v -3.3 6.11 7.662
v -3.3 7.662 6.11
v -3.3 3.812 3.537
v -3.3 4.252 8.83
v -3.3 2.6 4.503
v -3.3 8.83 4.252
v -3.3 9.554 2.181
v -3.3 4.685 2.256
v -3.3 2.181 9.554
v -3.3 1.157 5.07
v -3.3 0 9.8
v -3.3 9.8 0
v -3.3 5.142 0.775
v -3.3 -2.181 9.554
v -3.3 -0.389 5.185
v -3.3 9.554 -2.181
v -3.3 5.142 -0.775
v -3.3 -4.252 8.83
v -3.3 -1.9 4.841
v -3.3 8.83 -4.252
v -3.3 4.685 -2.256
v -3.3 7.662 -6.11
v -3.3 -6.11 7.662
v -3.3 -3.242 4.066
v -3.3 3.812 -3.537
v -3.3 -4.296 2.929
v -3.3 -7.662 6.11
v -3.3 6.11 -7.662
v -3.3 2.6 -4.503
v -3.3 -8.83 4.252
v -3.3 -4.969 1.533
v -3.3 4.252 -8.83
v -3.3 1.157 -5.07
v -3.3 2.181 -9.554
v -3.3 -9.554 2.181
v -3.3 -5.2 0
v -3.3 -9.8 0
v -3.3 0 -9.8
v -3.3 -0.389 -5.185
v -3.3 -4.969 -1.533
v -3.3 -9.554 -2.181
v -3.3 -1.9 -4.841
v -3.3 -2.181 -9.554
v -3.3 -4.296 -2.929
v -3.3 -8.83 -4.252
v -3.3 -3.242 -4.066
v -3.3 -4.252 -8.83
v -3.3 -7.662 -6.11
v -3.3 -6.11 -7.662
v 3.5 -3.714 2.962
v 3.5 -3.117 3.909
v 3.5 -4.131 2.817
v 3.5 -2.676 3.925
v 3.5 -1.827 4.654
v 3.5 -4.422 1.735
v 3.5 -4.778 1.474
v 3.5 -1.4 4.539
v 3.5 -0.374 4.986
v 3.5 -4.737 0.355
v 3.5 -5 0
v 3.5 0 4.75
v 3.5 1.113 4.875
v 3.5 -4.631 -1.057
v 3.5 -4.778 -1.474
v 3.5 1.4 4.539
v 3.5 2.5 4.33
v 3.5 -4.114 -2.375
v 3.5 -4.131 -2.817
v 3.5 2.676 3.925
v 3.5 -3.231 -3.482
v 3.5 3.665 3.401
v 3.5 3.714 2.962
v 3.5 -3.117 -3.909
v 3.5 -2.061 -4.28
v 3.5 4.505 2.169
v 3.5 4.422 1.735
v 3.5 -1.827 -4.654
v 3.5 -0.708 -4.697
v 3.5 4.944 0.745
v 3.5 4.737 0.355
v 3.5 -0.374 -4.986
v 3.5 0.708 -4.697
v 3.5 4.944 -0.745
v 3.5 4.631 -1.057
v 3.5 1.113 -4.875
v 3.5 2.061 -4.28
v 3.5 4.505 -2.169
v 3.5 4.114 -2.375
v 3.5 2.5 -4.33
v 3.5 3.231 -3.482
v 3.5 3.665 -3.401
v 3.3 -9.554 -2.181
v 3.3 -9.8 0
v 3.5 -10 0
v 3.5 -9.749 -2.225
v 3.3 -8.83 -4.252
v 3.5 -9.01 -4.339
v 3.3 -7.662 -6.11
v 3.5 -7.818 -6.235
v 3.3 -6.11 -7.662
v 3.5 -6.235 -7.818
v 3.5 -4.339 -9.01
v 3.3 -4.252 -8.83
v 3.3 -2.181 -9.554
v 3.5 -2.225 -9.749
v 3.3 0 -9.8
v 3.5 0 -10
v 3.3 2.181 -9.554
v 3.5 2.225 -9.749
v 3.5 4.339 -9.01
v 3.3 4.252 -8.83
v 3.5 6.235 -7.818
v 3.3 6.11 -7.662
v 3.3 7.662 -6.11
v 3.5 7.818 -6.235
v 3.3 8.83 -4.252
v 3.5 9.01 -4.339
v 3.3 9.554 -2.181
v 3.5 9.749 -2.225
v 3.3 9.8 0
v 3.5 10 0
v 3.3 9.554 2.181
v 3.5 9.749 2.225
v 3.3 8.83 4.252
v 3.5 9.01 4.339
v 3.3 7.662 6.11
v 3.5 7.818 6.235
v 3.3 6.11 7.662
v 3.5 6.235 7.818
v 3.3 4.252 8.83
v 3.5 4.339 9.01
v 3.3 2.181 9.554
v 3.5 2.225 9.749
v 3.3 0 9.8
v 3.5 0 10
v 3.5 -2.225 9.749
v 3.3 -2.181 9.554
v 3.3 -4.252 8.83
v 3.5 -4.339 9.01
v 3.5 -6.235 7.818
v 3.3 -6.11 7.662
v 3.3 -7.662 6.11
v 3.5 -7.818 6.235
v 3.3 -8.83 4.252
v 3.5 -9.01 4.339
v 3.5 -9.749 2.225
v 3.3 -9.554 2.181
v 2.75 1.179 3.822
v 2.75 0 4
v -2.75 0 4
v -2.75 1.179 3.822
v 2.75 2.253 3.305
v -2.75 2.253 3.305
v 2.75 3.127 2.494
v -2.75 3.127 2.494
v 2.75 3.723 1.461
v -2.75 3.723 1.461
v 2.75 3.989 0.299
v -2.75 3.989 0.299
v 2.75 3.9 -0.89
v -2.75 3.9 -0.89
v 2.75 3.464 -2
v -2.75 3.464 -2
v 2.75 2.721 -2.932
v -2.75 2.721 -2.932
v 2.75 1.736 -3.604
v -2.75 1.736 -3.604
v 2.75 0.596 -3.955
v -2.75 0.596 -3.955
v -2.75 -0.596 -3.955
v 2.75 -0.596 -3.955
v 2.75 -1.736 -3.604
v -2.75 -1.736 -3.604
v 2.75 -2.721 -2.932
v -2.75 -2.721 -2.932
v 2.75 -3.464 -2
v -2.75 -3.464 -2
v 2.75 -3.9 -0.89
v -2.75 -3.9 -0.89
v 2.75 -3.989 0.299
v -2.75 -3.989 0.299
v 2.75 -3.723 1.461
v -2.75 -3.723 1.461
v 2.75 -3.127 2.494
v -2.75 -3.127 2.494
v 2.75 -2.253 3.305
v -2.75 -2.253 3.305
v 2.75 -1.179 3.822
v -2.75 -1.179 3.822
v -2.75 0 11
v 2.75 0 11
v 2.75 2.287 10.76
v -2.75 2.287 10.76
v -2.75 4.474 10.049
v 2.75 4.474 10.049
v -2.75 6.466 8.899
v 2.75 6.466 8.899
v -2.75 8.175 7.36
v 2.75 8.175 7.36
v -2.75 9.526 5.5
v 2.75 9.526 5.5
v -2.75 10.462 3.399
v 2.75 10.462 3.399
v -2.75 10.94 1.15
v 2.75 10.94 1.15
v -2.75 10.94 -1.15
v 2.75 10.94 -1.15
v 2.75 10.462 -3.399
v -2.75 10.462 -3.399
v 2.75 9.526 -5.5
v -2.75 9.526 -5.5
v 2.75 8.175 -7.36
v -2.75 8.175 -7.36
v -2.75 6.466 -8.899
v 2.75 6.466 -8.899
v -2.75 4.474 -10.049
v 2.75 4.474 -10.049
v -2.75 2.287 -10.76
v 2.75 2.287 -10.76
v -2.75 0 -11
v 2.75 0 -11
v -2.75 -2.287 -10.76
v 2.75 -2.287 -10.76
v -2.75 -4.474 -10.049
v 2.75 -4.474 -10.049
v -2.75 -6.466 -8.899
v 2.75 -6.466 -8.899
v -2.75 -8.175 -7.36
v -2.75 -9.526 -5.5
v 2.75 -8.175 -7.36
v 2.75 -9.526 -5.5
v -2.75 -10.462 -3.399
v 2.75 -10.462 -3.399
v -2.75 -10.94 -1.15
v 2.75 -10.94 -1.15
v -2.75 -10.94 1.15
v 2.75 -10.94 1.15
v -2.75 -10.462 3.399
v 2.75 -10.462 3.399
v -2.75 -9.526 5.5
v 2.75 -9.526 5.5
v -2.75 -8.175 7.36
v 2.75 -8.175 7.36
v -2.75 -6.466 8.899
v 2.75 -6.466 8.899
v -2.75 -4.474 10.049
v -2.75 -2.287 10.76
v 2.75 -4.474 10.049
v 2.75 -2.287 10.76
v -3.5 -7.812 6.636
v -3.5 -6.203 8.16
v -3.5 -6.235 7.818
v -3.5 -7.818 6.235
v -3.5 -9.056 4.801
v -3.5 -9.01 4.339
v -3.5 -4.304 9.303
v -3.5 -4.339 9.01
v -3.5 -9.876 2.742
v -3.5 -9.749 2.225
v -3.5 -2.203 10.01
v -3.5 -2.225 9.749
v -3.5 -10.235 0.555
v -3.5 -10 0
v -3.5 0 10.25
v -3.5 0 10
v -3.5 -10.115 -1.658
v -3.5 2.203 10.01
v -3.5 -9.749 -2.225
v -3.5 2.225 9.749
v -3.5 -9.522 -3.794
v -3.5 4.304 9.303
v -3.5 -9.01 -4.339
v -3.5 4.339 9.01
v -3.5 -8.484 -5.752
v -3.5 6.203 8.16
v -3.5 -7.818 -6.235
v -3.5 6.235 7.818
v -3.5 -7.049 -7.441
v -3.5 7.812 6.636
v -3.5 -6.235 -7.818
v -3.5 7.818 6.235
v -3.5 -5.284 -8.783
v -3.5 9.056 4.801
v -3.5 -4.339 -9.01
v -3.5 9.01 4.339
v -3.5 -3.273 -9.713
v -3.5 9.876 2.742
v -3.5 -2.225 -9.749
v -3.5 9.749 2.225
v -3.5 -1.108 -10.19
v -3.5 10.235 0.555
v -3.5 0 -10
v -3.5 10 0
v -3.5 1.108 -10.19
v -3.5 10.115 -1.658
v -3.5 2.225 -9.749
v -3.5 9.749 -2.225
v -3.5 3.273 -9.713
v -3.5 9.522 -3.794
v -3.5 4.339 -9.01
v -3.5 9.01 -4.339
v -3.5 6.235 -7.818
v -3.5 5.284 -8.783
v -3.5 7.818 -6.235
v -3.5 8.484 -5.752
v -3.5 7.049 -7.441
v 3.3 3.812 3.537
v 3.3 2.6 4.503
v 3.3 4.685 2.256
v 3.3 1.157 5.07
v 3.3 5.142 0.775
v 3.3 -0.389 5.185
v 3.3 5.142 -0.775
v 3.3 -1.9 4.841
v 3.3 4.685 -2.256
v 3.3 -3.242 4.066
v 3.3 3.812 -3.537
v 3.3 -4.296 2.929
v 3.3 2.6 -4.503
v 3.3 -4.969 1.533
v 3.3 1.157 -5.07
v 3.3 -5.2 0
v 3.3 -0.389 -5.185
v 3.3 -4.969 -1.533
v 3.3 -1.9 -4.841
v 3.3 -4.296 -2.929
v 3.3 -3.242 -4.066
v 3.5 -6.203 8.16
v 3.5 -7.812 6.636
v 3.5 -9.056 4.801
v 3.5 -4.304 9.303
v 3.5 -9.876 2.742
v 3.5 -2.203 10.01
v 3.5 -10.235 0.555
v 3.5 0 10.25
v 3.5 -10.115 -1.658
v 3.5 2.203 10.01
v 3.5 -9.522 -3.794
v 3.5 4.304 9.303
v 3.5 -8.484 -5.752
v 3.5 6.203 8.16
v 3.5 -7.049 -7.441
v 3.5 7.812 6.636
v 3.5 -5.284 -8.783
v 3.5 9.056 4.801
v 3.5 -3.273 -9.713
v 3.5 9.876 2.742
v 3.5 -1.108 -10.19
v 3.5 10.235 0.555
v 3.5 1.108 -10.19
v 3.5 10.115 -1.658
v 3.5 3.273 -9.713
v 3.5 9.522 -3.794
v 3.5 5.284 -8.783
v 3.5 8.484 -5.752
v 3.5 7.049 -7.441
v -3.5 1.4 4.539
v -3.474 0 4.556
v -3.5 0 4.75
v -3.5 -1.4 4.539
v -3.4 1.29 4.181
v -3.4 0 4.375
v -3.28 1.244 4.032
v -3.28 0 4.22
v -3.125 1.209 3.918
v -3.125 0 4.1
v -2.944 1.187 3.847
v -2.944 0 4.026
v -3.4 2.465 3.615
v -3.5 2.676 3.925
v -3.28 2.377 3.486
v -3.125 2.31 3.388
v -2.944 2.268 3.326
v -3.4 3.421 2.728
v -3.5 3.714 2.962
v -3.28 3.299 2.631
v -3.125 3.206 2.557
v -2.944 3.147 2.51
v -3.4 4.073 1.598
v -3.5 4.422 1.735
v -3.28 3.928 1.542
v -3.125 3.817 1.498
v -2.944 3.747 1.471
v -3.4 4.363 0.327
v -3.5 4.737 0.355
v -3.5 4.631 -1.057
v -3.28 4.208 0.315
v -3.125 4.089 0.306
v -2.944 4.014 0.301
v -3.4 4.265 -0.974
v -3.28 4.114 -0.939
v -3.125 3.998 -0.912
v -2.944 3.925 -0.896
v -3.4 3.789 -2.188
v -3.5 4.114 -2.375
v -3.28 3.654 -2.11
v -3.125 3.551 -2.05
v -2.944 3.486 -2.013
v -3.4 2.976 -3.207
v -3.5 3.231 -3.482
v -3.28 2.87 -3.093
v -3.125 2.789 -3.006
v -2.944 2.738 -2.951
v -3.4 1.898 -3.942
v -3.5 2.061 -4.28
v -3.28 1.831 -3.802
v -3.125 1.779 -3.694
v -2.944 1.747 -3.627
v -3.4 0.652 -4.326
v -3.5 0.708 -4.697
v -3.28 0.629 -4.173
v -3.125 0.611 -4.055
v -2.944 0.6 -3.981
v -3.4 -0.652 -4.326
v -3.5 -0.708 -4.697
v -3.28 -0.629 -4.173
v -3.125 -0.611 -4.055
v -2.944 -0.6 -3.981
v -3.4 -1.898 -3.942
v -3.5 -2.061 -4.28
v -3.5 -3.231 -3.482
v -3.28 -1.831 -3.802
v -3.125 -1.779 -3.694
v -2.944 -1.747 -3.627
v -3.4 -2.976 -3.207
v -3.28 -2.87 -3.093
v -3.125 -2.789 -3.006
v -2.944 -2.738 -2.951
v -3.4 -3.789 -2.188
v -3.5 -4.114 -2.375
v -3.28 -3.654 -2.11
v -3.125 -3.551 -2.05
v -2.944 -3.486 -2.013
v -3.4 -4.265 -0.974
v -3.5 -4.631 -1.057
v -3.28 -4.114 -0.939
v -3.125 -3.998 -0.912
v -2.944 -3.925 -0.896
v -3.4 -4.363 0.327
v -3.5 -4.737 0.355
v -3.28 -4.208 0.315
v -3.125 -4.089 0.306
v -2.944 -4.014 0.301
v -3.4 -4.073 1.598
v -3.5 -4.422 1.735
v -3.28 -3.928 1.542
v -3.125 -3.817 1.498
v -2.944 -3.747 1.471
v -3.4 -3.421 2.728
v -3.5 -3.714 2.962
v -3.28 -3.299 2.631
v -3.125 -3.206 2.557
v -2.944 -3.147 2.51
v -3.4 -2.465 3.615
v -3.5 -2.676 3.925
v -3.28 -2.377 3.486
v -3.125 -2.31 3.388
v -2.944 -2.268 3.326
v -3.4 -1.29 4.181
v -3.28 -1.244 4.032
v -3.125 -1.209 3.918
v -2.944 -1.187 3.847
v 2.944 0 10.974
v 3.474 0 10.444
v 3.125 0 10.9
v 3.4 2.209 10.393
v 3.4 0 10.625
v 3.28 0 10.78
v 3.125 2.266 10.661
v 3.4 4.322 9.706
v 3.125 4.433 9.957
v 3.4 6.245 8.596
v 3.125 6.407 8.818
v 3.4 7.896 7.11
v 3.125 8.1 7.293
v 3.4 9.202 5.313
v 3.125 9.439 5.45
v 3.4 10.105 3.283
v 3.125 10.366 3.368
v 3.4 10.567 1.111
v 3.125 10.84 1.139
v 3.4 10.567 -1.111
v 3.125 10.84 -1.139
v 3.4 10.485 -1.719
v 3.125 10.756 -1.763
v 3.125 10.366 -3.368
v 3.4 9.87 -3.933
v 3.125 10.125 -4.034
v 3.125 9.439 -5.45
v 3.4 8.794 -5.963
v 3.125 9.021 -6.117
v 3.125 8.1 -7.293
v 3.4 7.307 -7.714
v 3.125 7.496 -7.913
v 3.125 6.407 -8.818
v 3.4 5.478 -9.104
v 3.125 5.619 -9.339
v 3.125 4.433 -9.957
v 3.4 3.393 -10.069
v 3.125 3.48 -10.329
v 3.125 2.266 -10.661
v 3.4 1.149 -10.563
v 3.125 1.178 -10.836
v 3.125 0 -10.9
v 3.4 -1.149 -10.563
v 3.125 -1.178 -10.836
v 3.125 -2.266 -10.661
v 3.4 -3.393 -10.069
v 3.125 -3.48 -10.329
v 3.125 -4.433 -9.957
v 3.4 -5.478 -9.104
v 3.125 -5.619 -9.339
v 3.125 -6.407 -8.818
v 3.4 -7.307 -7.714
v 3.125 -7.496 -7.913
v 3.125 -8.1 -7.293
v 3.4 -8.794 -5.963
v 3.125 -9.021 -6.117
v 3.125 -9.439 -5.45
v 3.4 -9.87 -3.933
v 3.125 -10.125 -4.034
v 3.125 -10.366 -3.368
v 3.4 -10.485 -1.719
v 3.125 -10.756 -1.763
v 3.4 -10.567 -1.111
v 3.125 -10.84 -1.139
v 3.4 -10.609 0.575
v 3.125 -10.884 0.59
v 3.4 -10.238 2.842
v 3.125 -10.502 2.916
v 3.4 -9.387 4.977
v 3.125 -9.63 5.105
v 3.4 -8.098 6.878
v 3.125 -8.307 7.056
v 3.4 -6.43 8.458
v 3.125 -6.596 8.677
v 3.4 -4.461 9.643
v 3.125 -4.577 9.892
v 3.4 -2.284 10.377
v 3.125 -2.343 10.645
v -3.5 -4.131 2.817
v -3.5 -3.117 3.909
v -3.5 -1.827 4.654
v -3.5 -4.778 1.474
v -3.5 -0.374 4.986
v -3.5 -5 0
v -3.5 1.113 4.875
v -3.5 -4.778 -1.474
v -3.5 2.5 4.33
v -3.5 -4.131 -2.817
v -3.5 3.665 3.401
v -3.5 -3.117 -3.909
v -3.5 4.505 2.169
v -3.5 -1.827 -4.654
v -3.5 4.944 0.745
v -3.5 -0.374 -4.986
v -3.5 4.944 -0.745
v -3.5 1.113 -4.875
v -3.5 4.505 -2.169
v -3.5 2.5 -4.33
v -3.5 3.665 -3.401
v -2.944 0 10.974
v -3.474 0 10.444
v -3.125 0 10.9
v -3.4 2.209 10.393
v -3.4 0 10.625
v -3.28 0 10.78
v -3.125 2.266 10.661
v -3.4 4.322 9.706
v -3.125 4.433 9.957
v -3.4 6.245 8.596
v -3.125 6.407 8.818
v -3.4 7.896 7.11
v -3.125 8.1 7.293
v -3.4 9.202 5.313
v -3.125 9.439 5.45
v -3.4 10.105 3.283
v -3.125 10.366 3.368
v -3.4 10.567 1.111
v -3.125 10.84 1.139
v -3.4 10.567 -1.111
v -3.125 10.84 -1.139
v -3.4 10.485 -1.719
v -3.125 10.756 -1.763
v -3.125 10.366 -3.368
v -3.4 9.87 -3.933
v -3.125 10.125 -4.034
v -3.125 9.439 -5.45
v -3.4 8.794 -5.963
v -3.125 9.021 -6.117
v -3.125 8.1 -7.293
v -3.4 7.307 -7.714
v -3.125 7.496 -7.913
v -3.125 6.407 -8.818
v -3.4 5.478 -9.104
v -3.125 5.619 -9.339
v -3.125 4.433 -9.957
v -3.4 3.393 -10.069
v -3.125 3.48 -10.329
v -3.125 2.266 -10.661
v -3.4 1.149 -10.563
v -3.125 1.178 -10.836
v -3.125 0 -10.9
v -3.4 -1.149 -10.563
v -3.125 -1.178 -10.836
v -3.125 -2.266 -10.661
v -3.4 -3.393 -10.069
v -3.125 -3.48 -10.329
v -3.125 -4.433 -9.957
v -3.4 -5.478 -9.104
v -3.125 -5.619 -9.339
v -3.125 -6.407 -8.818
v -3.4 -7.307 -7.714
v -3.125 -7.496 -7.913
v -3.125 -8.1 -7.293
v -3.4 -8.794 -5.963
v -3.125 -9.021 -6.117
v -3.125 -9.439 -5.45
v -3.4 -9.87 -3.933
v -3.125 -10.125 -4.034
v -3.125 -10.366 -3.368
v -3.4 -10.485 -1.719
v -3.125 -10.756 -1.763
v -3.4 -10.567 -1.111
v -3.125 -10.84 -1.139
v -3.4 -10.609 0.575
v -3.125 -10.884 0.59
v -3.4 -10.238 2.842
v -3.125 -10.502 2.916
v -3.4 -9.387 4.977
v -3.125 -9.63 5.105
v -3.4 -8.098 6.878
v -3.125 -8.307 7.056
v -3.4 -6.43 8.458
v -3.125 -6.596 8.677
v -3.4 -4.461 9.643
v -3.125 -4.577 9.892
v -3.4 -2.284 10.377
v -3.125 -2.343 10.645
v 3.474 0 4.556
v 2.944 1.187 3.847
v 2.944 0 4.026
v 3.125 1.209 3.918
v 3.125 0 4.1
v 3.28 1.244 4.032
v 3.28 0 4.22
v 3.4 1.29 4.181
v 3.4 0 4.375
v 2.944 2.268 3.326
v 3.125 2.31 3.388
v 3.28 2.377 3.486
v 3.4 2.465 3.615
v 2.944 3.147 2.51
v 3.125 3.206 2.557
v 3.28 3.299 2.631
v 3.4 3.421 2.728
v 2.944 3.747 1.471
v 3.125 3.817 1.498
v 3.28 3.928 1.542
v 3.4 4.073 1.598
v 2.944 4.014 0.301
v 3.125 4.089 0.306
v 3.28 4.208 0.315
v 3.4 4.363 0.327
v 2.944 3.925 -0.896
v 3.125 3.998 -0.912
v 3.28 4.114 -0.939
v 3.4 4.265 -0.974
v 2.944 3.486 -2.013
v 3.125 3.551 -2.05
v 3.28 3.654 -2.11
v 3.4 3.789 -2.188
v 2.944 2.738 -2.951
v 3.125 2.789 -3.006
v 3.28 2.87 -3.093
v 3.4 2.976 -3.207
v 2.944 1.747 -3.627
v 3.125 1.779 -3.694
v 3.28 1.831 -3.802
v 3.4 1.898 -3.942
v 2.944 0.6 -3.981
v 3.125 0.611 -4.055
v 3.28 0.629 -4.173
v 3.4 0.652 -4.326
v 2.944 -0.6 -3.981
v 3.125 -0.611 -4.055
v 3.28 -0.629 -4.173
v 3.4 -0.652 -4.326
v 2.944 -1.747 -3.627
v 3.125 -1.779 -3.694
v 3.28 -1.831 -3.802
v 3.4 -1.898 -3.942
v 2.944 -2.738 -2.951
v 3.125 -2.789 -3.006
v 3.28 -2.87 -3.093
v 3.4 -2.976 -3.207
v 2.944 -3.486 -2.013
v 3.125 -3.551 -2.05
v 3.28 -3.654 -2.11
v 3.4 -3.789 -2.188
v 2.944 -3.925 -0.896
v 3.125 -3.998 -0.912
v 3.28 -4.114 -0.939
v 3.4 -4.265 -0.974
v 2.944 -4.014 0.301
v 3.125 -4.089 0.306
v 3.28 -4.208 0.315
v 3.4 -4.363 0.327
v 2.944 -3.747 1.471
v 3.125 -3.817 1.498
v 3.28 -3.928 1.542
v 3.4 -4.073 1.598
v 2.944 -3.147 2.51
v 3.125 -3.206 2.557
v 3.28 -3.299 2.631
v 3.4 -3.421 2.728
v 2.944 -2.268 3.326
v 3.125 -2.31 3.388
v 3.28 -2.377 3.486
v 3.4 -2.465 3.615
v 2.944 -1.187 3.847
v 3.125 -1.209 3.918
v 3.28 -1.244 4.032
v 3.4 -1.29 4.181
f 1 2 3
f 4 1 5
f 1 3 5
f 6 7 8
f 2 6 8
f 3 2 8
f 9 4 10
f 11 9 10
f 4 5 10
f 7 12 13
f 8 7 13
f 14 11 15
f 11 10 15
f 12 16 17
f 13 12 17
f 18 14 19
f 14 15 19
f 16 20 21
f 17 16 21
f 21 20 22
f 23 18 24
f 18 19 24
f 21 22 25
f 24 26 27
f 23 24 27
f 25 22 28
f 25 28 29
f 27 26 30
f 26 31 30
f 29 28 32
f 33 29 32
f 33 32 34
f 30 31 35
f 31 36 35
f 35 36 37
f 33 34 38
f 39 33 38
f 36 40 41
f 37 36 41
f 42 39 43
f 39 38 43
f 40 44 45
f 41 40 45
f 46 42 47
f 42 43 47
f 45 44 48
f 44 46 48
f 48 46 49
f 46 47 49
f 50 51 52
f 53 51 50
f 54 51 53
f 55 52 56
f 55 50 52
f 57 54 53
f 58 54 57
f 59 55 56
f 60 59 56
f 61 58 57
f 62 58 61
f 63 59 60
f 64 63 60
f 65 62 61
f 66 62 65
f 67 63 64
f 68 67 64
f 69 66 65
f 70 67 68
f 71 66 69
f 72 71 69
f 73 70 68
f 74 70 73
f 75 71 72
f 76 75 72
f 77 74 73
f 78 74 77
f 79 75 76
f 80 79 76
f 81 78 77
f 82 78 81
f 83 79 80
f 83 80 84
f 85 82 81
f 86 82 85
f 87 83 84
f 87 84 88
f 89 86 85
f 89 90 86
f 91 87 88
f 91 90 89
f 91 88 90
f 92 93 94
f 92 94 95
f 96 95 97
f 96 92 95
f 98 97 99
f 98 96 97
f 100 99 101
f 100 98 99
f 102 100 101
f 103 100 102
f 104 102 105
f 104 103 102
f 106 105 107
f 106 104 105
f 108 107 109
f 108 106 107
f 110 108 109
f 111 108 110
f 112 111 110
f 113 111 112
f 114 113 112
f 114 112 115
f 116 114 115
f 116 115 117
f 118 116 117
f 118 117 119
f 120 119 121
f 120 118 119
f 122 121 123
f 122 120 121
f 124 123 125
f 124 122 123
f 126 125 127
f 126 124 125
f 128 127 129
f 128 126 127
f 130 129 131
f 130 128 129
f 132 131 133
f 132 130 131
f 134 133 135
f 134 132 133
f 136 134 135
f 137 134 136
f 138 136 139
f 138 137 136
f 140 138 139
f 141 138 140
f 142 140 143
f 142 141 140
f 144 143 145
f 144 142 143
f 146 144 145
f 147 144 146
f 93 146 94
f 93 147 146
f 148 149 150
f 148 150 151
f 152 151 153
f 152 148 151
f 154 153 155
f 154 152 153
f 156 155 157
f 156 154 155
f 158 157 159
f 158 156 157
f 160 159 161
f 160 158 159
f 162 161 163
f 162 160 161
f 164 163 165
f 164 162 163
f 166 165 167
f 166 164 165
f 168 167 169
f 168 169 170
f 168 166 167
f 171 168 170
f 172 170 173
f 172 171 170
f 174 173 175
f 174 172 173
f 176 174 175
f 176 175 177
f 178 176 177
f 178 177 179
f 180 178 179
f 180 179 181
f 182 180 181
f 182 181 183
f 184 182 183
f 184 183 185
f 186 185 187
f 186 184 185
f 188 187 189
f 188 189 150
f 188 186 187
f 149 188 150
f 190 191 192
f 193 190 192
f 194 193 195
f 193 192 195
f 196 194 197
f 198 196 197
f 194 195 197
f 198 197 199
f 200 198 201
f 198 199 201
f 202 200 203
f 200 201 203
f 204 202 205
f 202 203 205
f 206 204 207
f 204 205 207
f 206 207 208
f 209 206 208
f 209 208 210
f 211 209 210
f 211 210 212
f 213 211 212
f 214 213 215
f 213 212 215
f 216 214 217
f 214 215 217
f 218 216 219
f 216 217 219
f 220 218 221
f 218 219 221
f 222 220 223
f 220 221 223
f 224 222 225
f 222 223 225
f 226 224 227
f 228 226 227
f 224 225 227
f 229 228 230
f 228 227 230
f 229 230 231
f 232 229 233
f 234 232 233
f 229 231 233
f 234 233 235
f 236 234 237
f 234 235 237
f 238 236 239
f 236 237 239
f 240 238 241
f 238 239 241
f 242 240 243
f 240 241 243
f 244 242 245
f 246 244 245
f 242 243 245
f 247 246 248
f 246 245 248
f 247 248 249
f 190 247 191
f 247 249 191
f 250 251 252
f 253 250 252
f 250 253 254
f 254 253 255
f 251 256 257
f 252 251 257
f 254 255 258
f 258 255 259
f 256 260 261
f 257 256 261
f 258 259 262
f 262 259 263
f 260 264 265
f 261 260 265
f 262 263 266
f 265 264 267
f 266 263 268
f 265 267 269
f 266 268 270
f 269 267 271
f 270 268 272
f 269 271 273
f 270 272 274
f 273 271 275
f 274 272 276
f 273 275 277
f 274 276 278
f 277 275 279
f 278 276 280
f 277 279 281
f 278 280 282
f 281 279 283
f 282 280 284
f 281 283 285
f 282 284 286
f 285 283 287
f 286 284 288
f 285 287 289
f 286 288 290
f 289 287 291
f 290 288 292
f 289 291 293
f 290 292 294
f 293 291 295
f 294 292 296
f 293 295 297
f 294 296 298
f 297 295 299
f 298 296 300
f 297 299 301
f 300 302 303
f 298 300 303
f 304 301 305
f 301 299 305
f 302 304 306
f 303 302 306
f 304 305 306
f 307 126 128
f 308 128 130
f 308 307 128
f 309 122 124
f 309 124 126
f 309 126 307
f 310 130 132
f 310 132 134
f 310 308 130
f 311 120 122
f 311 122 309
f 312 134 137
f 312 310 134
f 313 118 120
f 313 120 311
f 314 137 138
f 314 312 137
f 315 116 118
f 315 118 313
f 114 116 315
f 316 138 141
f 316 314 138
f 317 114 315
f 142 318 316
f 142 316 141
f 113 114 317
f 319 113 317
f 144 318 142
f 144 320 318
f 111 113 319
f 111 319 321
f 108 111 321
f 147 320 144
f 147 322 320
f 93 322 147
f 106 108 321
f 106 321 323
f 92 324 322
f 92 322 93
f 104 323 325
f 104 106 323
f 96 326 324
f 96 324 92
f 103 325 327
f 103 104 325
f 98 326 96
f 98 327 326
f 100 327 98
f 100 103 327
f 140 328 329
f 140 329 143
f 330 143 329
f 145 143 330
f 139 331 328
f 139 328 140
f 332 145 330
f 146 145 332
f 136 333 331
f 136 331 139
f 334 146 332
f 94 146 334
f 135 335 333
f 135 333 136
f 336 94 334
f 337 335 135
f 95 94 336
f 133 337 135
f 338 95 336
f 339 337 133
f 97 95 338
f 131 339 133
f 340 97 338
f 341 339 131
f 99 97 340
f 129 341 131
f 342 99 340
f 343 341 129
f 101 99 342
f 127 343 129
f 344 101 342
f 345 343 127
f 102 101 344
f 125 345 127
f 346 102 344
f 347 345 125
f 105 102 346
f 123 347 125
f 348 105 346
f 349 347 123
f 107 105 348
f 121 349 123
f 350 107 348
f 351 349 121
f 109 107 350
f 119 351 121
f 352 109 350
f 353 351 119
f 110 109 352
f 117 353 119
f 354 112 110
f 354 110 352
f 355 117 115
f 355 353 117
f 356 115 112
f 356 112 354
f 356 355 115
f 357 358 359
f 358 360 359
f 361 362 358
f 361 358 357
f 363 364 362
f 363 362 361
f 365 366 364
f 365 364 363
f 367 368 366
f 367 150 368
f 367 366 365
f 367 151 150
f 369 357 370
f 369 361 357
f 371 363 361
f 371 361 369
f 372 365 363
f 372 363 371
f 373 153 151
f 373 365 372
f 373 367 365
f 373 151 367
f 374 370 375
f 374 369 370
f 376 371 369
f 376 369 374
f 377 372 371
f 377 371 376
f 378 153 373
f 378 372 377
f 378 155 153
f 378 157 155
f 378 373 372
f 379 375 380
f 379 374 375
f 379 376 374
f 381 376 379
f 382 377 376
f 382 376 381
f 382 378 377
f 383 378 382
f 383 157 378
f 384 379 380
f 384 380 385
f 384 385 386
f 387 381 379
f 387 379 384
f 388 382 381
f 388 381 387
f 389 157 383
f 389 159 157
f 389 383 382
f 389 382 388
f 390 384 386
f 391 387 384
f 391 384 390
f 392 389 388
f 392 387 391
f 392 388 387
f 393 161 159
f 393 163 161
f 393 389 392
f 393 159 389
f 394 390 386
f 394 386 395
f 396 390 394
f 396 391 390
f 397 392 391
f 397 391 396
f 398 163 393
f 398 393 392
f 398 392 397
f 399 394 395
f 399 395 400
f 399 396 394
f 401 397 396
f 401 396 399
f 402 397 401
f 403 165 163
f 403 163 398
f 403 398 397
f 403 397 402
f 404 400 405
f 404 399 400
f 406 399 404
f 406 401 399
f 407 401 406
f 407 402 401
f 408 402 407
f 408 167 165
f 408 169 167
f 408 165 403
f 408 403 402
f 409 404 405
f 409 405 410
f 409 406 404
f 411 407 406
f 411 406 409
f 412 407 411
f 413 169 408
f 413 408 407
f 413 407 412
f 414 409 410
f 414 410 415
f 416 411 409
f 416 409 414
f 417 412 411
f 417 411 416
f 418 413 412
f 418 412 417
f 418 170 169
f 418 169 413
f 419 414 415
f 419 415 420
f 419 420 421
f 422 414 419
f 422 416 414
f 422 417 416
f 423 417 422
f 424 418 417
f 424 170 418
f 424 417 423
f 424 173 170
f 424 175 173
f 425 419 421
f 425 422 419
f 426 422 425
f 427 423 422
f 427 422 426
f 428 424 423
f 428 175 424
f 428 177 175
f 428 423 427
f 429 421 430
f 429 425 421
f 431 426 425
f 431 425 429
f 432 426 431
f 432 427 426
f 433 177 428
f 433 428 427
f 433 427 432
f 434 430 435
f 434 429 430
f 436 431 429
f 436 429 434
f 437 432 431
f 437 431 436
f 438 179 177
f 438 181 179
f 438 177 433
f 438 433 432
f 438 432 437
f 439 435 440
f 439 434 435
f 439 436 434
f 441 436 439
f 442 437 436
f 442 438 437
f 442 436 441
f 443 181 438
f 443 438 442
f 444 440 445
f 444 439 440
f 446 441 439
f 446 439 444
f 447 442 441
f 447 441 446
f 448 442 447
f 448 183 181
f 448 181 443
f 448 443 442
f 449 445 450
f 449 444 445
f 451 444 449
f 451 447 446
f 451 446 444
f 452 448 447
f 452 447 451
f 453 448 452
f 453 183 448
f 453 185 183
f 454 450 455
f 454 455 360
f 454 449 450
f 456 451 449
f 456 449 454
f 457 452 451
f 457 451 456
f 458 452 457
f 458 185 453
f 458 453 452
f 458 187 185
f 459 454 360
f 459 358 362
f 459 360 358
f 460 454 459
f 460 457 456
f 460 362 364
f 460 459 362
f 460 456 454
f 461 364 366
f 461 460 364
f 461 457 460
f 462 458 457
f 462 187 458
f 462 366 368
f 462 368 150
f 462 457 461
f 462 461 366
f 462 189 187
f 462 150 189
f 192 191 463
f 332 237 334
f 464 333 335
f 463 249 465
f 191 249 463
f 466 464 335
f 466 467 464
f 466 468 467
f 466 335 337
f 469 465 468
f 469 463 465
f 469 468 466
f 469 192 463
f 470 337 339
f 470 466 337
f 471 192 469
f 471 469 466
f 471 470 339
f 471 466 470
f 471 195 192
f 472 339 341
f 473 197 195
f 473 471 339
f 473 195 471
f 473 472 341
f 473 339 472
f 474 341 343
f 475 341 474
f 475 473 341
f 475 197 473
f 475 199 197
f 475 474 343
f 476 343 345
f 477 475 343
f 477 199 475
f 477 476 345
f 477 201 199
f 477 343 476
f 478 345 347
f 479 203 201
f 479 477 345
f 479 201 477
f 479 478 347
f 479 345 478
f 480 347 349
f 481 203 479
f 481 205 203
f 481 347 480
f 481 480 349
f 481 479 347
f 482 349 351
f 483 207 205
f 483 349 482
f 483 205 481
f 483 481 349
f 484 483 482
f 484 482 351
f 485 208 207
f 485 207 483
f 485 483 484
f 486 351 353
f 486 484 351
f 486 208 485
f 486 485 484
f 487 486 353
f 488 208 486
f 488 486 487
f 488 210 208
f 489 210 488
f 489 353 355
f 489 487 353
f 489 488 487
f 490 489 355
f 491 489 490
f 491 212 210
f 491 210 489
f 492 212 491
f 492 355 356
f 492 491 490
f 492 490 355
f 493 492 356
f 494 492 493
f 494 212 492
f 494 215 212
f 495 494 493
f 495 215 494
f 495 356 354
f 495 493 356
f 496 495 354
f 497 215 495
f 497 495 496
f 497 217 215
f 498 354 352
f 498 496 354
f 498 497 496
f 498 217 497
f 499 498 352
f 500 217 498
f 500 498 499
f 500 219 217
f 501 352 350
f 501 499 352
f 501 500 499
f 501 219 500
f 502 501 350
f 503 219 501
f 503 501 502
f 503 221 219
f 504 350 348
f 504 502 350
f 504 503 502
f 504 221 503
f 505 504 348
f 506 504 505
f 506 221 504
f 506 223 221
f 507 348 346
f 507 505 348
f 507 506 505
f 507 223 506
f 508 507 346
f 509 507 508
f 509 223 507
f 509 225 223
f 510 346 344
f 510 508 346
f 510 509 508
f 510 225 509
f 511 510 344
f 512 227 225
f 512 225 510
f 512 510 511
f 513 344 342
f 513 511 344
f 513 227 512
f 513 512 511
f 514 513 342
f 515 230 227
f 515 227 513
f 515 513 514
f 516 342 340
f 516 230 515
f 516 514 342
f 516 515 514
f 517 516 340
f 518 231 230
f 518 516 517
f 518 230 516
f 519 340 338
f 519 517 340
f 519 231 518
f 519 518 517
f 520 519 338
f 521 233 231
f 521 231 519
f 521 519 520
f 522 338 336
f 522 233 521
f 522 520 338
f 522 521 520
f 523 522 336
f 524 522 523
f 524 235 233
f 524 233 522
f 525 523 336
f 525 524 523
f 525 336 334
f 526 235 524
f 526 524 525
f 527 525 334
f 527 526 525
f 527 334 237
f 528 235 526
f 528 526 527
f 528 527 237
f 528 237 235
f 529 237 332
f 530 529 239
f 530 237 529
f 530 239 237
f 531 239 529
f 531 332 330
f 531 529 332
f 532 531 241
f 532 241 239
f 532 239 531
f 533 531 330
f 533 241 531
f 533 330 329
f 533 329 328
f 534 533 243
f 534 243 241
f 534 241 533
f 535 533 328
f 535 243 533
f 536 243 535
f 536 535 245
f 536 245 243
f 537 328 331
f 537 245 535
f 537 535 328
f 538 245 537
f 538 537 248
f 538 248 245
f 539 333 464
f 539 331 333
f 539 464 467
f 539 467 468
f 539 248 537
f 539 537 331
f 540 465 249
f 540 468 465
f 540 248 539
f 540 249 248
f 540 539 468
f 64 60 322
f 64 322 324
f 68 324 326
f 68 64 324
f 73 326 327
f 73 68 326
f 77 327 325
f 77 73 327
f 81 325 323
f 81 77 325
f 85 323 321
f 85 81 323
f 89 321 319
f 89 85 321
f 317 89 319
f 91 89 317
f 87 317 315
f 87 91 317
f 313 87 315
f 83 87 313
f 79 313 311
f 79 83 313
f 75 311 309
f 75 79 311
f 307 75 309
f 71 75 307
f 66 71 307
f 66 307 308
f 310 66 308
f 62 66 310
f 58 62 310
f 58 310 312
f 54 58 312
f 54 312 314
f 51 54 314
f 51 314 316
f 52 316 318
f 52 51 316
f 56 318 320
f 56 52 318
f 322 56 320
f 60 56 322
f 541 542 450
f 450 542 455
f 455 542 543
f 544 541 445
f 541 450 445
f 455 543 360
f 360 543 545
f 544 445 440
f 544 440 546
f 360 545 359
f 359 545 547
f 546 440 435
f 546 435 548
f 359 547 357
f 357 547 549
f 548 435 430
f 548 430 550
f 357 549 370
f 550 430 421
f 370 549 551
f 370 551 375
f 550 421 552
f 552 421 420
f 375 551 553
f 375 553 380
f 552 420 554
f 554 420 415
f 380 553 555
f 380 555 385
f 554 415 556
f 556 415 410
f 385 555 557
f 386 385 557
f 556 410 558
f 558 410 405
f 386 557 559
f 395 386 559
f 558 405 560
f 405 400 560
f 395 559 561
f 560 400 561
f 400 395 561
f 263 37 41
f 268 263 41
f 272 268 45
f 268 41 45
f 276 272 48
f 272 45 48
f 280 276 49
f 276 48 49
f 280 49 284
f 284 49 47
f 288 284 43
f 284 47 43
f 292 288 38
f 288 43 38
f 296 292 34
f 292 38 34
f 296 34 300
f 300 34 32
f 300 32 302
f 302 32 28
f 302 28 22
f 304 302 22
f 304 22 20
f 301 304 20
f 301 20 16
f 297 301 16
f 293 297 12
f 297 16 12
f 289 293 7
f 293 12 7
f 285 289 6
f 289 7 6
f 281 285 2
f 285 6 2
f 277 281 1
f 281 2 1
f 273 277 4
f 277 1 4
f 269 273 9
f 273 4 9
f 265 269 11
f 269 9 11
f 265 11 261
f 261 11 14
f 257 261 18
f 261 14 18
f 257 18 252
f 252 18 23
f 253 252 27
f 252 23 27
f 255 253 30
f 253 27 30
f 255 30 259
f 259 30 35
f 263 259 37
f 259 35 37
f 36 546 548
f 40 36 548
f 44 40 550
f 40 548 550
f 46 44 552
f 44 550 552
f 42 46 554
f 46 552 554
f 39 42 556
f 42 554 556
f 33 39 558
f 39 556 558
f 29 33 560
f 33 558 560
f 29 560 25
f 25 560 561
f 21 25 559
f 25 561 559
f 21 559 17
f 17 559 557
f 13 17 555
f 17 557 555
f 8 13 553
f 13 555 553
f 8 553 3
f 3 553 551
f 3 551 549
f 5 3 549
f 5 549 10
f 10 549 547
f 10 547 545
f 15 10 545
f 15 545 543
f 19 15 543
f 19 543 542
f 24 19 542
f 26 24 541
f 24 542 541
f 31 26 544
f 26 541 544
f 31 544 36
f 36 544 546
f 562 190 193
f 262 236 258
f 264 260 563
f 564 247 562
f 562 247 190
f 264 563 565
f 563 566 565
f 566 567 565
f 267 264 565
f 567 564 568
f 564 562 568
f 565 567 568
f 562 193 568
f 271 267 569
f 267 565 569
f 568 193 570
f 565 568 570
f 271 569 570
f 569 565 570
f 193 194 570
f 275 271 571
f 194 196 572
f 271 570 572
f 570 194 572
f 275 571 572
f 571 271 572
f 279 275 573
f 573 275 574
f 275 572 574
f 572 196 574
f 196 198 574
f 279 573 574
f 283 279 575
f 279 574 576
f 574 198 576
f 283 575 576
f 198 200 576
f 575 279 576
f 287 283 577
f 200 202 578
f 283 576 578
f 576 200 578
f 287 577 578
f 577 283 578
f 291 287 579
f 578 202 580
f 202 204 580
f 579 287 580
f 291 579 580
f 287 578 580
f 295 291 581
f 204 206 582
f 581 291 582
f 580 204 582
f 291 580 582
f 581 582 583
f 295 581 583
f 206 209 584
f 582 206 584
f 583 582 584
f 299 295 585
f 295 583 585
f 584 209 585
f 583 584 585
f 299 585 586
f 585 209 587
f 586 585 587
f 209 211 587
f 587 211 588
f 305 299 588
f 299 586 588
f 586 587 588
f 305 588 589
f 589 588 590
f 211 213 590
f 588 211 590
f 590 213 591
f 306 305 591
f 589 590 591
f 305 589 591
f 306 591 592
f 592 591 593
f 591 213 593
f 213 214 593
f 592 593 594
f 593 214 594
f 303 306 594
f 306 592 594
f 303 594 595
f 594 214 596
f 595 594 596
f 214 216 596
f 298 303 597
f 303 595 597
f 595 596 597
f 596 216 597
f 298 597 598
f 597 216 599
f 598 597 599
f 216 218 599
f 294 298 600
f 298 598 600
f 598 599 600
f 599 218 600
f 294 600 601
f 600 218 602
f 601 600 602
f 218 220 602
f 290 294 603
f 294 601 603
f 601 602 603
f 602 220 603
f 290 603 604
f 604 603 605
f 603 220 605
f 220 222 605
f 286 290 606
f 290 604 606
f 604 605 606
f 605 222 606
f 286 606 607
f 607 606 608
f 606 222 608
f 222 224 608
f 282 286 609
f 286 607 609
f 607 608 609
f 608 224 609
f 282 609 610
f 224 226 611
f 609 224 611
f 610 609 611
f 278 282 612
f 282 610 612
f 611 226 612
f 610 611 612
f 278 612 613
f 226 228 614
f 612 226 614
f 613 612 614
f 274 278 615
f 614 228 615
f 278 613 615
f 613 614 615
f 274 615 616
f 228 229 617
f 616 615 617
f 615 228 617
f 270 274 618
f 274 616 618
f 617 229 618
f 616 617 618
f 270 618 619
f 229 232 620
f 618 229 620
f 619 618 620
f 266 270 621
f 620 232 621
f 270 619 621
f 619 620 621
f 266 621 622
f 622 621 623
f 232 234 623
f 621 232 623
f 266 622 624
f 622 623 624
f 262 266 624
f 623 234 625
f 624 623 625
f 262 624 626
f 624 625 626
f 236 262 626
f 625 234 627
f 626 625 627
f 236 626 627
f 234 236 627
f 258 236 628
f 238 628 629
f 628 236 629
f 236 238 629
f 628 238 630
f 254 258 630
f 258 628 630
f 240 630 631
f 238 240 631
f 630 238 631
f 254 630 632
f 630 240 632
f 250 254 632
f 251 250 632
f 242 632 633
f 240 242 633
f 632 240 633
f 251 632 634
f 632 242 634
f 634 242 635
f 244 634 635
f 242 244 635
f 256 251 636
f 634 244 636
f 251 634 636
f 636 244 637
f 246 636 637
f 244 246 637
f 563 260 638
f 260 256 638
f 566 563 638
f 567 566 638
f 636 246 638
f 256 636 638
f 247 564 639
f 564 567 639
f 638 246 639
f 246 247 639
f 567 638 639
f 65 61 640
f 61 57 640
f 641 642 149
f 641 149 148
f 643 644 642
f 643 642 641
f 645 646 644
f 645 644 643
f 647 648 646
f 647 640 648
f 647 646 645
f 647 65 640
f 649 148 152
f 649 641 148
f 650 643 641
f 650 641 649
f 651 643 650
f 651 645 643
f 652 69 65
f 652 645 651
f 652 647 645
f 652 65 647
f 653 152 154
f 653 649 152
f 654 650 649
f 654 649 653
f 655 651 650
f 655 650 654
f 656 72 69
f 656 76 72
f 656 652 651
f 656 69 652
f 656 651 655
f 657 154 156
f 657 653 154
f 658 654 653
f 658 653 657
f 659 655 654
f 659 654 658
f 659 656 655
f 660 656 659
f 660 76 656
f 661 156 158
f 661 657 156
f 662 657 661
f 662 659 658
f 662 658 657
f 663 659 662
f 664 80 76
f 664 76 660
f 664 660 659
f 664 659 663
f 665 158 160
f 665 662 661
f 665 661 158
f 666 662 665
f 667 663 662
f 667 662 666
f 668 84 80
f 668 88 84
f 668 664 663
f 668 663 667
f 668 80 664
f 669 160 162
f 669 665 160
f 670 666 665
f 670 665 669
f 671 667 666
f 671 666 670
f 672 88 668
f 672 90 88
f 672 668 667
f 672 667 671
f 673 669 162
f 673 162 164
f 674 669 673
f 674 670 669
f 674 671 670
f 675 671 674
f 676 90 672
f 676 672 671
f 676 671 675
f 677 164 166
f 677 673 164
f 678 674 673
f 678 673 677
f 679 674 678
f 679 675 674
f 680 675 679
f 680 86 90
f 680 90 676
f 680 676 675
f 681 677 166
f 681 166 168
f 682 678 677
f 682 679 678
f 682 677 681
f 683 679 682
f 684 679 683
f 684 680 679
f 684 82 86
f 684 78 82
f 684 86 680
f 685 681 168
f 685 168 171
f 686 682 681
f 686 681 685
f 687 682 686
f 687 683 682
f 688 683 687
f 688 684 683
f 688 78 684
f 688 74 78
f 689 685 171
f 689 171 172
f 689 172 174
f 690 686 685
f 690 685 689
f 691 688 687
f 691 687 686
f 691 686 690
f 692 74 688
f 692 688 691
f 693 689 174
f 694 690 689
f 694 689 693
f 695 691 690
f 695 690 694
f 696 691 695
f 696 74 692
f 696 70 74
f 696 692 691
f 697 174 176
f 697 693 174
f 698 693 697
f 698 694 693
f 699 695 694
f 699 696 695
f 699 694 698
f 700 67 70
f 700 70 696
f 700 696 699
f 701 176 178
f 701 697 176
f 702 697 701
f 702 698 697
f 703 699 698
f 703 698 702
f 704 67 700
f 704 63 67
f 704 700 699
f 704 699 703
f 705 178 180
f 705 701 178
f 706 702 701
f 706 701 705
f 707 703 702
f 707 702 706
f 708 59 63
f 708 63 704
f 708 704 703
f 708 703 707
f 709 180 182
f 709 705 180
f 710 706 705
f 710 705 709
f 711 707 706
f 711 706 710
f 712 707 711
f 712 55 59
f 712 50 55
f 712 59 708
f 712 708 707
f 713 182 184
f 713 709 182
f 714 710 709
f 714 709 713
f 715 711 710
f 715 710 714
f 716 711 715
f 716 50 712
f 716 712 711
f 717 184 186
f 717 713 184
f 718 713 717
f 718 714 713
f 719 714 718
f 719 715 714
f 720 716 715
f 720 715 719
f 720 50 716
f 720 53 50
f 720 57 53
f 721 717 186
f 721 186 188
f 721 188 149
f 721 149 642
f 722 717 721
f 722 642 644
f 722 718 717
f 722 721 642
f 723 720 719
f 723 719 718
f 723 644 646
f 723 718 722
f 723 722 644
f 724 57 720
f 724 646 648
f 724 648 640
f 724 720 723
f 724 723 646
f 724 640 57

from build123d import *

# Parameters (mm, degrees)
F0_W    = 7
F0_H    = 7
F2_R    = 0.75
F3_W    = 0.2
F3_H    = 5
F5_SIZE = 0.19999


# Not quite as in the source:
# - a fillet or chamfer is up to 0.001 mm smaller than in the source, because OpenCascade refuses the exact size


with BuildPart() as f1:
    # F0 (on Front) → F1 (revolve)
    with BuildSketch(Plane.XZ):
        with Locations((0, 7.5)):
            Rectangle(F0_W, F0_H)
    revolve(axis=Axis((-0.6671294104, 0, 0), (-1, 0, 0)))

    # F2
    f2_edges = [f1.edges().sort_by_distance(p)[0] for p in [
        (-3.5, 0, -11),
        (-3.5, 0, -4),
        (3.5, 0, -11),
        (3.5, 0, -4),
    ]]
    fillet(f2_edges, radius=F2_R)

    # F3 (on Top) → F4 (revolve, cut)
    with BuildSketch(Plane.XY):
        with Locations((-3.4, -7.5)):
            Rectangle(F3_W, F3_H)
        with Locations((3.4, -7.5)):
            Rectangle(F3_W, F3_H)
    revolve(axis=Axis((0.1337367576, 0, 0), (1, 0, 0)), mode=Mode.SUBTRACT)

    # F5 (size 0.2 in the source; OpenCascade refuses exactly that, so slightly less here)
    f5_edges = [f1.edges().sort_by_distance(p)[0] for p in [
        (-3.3, 10, 0),
        (-3.3, 5, 0),
        (3.3, 10, 0),
        (3.3, 5, 0),
    ]]
    chamfer(f5_edges, length=F5_SIZE)


solid = f1.part
